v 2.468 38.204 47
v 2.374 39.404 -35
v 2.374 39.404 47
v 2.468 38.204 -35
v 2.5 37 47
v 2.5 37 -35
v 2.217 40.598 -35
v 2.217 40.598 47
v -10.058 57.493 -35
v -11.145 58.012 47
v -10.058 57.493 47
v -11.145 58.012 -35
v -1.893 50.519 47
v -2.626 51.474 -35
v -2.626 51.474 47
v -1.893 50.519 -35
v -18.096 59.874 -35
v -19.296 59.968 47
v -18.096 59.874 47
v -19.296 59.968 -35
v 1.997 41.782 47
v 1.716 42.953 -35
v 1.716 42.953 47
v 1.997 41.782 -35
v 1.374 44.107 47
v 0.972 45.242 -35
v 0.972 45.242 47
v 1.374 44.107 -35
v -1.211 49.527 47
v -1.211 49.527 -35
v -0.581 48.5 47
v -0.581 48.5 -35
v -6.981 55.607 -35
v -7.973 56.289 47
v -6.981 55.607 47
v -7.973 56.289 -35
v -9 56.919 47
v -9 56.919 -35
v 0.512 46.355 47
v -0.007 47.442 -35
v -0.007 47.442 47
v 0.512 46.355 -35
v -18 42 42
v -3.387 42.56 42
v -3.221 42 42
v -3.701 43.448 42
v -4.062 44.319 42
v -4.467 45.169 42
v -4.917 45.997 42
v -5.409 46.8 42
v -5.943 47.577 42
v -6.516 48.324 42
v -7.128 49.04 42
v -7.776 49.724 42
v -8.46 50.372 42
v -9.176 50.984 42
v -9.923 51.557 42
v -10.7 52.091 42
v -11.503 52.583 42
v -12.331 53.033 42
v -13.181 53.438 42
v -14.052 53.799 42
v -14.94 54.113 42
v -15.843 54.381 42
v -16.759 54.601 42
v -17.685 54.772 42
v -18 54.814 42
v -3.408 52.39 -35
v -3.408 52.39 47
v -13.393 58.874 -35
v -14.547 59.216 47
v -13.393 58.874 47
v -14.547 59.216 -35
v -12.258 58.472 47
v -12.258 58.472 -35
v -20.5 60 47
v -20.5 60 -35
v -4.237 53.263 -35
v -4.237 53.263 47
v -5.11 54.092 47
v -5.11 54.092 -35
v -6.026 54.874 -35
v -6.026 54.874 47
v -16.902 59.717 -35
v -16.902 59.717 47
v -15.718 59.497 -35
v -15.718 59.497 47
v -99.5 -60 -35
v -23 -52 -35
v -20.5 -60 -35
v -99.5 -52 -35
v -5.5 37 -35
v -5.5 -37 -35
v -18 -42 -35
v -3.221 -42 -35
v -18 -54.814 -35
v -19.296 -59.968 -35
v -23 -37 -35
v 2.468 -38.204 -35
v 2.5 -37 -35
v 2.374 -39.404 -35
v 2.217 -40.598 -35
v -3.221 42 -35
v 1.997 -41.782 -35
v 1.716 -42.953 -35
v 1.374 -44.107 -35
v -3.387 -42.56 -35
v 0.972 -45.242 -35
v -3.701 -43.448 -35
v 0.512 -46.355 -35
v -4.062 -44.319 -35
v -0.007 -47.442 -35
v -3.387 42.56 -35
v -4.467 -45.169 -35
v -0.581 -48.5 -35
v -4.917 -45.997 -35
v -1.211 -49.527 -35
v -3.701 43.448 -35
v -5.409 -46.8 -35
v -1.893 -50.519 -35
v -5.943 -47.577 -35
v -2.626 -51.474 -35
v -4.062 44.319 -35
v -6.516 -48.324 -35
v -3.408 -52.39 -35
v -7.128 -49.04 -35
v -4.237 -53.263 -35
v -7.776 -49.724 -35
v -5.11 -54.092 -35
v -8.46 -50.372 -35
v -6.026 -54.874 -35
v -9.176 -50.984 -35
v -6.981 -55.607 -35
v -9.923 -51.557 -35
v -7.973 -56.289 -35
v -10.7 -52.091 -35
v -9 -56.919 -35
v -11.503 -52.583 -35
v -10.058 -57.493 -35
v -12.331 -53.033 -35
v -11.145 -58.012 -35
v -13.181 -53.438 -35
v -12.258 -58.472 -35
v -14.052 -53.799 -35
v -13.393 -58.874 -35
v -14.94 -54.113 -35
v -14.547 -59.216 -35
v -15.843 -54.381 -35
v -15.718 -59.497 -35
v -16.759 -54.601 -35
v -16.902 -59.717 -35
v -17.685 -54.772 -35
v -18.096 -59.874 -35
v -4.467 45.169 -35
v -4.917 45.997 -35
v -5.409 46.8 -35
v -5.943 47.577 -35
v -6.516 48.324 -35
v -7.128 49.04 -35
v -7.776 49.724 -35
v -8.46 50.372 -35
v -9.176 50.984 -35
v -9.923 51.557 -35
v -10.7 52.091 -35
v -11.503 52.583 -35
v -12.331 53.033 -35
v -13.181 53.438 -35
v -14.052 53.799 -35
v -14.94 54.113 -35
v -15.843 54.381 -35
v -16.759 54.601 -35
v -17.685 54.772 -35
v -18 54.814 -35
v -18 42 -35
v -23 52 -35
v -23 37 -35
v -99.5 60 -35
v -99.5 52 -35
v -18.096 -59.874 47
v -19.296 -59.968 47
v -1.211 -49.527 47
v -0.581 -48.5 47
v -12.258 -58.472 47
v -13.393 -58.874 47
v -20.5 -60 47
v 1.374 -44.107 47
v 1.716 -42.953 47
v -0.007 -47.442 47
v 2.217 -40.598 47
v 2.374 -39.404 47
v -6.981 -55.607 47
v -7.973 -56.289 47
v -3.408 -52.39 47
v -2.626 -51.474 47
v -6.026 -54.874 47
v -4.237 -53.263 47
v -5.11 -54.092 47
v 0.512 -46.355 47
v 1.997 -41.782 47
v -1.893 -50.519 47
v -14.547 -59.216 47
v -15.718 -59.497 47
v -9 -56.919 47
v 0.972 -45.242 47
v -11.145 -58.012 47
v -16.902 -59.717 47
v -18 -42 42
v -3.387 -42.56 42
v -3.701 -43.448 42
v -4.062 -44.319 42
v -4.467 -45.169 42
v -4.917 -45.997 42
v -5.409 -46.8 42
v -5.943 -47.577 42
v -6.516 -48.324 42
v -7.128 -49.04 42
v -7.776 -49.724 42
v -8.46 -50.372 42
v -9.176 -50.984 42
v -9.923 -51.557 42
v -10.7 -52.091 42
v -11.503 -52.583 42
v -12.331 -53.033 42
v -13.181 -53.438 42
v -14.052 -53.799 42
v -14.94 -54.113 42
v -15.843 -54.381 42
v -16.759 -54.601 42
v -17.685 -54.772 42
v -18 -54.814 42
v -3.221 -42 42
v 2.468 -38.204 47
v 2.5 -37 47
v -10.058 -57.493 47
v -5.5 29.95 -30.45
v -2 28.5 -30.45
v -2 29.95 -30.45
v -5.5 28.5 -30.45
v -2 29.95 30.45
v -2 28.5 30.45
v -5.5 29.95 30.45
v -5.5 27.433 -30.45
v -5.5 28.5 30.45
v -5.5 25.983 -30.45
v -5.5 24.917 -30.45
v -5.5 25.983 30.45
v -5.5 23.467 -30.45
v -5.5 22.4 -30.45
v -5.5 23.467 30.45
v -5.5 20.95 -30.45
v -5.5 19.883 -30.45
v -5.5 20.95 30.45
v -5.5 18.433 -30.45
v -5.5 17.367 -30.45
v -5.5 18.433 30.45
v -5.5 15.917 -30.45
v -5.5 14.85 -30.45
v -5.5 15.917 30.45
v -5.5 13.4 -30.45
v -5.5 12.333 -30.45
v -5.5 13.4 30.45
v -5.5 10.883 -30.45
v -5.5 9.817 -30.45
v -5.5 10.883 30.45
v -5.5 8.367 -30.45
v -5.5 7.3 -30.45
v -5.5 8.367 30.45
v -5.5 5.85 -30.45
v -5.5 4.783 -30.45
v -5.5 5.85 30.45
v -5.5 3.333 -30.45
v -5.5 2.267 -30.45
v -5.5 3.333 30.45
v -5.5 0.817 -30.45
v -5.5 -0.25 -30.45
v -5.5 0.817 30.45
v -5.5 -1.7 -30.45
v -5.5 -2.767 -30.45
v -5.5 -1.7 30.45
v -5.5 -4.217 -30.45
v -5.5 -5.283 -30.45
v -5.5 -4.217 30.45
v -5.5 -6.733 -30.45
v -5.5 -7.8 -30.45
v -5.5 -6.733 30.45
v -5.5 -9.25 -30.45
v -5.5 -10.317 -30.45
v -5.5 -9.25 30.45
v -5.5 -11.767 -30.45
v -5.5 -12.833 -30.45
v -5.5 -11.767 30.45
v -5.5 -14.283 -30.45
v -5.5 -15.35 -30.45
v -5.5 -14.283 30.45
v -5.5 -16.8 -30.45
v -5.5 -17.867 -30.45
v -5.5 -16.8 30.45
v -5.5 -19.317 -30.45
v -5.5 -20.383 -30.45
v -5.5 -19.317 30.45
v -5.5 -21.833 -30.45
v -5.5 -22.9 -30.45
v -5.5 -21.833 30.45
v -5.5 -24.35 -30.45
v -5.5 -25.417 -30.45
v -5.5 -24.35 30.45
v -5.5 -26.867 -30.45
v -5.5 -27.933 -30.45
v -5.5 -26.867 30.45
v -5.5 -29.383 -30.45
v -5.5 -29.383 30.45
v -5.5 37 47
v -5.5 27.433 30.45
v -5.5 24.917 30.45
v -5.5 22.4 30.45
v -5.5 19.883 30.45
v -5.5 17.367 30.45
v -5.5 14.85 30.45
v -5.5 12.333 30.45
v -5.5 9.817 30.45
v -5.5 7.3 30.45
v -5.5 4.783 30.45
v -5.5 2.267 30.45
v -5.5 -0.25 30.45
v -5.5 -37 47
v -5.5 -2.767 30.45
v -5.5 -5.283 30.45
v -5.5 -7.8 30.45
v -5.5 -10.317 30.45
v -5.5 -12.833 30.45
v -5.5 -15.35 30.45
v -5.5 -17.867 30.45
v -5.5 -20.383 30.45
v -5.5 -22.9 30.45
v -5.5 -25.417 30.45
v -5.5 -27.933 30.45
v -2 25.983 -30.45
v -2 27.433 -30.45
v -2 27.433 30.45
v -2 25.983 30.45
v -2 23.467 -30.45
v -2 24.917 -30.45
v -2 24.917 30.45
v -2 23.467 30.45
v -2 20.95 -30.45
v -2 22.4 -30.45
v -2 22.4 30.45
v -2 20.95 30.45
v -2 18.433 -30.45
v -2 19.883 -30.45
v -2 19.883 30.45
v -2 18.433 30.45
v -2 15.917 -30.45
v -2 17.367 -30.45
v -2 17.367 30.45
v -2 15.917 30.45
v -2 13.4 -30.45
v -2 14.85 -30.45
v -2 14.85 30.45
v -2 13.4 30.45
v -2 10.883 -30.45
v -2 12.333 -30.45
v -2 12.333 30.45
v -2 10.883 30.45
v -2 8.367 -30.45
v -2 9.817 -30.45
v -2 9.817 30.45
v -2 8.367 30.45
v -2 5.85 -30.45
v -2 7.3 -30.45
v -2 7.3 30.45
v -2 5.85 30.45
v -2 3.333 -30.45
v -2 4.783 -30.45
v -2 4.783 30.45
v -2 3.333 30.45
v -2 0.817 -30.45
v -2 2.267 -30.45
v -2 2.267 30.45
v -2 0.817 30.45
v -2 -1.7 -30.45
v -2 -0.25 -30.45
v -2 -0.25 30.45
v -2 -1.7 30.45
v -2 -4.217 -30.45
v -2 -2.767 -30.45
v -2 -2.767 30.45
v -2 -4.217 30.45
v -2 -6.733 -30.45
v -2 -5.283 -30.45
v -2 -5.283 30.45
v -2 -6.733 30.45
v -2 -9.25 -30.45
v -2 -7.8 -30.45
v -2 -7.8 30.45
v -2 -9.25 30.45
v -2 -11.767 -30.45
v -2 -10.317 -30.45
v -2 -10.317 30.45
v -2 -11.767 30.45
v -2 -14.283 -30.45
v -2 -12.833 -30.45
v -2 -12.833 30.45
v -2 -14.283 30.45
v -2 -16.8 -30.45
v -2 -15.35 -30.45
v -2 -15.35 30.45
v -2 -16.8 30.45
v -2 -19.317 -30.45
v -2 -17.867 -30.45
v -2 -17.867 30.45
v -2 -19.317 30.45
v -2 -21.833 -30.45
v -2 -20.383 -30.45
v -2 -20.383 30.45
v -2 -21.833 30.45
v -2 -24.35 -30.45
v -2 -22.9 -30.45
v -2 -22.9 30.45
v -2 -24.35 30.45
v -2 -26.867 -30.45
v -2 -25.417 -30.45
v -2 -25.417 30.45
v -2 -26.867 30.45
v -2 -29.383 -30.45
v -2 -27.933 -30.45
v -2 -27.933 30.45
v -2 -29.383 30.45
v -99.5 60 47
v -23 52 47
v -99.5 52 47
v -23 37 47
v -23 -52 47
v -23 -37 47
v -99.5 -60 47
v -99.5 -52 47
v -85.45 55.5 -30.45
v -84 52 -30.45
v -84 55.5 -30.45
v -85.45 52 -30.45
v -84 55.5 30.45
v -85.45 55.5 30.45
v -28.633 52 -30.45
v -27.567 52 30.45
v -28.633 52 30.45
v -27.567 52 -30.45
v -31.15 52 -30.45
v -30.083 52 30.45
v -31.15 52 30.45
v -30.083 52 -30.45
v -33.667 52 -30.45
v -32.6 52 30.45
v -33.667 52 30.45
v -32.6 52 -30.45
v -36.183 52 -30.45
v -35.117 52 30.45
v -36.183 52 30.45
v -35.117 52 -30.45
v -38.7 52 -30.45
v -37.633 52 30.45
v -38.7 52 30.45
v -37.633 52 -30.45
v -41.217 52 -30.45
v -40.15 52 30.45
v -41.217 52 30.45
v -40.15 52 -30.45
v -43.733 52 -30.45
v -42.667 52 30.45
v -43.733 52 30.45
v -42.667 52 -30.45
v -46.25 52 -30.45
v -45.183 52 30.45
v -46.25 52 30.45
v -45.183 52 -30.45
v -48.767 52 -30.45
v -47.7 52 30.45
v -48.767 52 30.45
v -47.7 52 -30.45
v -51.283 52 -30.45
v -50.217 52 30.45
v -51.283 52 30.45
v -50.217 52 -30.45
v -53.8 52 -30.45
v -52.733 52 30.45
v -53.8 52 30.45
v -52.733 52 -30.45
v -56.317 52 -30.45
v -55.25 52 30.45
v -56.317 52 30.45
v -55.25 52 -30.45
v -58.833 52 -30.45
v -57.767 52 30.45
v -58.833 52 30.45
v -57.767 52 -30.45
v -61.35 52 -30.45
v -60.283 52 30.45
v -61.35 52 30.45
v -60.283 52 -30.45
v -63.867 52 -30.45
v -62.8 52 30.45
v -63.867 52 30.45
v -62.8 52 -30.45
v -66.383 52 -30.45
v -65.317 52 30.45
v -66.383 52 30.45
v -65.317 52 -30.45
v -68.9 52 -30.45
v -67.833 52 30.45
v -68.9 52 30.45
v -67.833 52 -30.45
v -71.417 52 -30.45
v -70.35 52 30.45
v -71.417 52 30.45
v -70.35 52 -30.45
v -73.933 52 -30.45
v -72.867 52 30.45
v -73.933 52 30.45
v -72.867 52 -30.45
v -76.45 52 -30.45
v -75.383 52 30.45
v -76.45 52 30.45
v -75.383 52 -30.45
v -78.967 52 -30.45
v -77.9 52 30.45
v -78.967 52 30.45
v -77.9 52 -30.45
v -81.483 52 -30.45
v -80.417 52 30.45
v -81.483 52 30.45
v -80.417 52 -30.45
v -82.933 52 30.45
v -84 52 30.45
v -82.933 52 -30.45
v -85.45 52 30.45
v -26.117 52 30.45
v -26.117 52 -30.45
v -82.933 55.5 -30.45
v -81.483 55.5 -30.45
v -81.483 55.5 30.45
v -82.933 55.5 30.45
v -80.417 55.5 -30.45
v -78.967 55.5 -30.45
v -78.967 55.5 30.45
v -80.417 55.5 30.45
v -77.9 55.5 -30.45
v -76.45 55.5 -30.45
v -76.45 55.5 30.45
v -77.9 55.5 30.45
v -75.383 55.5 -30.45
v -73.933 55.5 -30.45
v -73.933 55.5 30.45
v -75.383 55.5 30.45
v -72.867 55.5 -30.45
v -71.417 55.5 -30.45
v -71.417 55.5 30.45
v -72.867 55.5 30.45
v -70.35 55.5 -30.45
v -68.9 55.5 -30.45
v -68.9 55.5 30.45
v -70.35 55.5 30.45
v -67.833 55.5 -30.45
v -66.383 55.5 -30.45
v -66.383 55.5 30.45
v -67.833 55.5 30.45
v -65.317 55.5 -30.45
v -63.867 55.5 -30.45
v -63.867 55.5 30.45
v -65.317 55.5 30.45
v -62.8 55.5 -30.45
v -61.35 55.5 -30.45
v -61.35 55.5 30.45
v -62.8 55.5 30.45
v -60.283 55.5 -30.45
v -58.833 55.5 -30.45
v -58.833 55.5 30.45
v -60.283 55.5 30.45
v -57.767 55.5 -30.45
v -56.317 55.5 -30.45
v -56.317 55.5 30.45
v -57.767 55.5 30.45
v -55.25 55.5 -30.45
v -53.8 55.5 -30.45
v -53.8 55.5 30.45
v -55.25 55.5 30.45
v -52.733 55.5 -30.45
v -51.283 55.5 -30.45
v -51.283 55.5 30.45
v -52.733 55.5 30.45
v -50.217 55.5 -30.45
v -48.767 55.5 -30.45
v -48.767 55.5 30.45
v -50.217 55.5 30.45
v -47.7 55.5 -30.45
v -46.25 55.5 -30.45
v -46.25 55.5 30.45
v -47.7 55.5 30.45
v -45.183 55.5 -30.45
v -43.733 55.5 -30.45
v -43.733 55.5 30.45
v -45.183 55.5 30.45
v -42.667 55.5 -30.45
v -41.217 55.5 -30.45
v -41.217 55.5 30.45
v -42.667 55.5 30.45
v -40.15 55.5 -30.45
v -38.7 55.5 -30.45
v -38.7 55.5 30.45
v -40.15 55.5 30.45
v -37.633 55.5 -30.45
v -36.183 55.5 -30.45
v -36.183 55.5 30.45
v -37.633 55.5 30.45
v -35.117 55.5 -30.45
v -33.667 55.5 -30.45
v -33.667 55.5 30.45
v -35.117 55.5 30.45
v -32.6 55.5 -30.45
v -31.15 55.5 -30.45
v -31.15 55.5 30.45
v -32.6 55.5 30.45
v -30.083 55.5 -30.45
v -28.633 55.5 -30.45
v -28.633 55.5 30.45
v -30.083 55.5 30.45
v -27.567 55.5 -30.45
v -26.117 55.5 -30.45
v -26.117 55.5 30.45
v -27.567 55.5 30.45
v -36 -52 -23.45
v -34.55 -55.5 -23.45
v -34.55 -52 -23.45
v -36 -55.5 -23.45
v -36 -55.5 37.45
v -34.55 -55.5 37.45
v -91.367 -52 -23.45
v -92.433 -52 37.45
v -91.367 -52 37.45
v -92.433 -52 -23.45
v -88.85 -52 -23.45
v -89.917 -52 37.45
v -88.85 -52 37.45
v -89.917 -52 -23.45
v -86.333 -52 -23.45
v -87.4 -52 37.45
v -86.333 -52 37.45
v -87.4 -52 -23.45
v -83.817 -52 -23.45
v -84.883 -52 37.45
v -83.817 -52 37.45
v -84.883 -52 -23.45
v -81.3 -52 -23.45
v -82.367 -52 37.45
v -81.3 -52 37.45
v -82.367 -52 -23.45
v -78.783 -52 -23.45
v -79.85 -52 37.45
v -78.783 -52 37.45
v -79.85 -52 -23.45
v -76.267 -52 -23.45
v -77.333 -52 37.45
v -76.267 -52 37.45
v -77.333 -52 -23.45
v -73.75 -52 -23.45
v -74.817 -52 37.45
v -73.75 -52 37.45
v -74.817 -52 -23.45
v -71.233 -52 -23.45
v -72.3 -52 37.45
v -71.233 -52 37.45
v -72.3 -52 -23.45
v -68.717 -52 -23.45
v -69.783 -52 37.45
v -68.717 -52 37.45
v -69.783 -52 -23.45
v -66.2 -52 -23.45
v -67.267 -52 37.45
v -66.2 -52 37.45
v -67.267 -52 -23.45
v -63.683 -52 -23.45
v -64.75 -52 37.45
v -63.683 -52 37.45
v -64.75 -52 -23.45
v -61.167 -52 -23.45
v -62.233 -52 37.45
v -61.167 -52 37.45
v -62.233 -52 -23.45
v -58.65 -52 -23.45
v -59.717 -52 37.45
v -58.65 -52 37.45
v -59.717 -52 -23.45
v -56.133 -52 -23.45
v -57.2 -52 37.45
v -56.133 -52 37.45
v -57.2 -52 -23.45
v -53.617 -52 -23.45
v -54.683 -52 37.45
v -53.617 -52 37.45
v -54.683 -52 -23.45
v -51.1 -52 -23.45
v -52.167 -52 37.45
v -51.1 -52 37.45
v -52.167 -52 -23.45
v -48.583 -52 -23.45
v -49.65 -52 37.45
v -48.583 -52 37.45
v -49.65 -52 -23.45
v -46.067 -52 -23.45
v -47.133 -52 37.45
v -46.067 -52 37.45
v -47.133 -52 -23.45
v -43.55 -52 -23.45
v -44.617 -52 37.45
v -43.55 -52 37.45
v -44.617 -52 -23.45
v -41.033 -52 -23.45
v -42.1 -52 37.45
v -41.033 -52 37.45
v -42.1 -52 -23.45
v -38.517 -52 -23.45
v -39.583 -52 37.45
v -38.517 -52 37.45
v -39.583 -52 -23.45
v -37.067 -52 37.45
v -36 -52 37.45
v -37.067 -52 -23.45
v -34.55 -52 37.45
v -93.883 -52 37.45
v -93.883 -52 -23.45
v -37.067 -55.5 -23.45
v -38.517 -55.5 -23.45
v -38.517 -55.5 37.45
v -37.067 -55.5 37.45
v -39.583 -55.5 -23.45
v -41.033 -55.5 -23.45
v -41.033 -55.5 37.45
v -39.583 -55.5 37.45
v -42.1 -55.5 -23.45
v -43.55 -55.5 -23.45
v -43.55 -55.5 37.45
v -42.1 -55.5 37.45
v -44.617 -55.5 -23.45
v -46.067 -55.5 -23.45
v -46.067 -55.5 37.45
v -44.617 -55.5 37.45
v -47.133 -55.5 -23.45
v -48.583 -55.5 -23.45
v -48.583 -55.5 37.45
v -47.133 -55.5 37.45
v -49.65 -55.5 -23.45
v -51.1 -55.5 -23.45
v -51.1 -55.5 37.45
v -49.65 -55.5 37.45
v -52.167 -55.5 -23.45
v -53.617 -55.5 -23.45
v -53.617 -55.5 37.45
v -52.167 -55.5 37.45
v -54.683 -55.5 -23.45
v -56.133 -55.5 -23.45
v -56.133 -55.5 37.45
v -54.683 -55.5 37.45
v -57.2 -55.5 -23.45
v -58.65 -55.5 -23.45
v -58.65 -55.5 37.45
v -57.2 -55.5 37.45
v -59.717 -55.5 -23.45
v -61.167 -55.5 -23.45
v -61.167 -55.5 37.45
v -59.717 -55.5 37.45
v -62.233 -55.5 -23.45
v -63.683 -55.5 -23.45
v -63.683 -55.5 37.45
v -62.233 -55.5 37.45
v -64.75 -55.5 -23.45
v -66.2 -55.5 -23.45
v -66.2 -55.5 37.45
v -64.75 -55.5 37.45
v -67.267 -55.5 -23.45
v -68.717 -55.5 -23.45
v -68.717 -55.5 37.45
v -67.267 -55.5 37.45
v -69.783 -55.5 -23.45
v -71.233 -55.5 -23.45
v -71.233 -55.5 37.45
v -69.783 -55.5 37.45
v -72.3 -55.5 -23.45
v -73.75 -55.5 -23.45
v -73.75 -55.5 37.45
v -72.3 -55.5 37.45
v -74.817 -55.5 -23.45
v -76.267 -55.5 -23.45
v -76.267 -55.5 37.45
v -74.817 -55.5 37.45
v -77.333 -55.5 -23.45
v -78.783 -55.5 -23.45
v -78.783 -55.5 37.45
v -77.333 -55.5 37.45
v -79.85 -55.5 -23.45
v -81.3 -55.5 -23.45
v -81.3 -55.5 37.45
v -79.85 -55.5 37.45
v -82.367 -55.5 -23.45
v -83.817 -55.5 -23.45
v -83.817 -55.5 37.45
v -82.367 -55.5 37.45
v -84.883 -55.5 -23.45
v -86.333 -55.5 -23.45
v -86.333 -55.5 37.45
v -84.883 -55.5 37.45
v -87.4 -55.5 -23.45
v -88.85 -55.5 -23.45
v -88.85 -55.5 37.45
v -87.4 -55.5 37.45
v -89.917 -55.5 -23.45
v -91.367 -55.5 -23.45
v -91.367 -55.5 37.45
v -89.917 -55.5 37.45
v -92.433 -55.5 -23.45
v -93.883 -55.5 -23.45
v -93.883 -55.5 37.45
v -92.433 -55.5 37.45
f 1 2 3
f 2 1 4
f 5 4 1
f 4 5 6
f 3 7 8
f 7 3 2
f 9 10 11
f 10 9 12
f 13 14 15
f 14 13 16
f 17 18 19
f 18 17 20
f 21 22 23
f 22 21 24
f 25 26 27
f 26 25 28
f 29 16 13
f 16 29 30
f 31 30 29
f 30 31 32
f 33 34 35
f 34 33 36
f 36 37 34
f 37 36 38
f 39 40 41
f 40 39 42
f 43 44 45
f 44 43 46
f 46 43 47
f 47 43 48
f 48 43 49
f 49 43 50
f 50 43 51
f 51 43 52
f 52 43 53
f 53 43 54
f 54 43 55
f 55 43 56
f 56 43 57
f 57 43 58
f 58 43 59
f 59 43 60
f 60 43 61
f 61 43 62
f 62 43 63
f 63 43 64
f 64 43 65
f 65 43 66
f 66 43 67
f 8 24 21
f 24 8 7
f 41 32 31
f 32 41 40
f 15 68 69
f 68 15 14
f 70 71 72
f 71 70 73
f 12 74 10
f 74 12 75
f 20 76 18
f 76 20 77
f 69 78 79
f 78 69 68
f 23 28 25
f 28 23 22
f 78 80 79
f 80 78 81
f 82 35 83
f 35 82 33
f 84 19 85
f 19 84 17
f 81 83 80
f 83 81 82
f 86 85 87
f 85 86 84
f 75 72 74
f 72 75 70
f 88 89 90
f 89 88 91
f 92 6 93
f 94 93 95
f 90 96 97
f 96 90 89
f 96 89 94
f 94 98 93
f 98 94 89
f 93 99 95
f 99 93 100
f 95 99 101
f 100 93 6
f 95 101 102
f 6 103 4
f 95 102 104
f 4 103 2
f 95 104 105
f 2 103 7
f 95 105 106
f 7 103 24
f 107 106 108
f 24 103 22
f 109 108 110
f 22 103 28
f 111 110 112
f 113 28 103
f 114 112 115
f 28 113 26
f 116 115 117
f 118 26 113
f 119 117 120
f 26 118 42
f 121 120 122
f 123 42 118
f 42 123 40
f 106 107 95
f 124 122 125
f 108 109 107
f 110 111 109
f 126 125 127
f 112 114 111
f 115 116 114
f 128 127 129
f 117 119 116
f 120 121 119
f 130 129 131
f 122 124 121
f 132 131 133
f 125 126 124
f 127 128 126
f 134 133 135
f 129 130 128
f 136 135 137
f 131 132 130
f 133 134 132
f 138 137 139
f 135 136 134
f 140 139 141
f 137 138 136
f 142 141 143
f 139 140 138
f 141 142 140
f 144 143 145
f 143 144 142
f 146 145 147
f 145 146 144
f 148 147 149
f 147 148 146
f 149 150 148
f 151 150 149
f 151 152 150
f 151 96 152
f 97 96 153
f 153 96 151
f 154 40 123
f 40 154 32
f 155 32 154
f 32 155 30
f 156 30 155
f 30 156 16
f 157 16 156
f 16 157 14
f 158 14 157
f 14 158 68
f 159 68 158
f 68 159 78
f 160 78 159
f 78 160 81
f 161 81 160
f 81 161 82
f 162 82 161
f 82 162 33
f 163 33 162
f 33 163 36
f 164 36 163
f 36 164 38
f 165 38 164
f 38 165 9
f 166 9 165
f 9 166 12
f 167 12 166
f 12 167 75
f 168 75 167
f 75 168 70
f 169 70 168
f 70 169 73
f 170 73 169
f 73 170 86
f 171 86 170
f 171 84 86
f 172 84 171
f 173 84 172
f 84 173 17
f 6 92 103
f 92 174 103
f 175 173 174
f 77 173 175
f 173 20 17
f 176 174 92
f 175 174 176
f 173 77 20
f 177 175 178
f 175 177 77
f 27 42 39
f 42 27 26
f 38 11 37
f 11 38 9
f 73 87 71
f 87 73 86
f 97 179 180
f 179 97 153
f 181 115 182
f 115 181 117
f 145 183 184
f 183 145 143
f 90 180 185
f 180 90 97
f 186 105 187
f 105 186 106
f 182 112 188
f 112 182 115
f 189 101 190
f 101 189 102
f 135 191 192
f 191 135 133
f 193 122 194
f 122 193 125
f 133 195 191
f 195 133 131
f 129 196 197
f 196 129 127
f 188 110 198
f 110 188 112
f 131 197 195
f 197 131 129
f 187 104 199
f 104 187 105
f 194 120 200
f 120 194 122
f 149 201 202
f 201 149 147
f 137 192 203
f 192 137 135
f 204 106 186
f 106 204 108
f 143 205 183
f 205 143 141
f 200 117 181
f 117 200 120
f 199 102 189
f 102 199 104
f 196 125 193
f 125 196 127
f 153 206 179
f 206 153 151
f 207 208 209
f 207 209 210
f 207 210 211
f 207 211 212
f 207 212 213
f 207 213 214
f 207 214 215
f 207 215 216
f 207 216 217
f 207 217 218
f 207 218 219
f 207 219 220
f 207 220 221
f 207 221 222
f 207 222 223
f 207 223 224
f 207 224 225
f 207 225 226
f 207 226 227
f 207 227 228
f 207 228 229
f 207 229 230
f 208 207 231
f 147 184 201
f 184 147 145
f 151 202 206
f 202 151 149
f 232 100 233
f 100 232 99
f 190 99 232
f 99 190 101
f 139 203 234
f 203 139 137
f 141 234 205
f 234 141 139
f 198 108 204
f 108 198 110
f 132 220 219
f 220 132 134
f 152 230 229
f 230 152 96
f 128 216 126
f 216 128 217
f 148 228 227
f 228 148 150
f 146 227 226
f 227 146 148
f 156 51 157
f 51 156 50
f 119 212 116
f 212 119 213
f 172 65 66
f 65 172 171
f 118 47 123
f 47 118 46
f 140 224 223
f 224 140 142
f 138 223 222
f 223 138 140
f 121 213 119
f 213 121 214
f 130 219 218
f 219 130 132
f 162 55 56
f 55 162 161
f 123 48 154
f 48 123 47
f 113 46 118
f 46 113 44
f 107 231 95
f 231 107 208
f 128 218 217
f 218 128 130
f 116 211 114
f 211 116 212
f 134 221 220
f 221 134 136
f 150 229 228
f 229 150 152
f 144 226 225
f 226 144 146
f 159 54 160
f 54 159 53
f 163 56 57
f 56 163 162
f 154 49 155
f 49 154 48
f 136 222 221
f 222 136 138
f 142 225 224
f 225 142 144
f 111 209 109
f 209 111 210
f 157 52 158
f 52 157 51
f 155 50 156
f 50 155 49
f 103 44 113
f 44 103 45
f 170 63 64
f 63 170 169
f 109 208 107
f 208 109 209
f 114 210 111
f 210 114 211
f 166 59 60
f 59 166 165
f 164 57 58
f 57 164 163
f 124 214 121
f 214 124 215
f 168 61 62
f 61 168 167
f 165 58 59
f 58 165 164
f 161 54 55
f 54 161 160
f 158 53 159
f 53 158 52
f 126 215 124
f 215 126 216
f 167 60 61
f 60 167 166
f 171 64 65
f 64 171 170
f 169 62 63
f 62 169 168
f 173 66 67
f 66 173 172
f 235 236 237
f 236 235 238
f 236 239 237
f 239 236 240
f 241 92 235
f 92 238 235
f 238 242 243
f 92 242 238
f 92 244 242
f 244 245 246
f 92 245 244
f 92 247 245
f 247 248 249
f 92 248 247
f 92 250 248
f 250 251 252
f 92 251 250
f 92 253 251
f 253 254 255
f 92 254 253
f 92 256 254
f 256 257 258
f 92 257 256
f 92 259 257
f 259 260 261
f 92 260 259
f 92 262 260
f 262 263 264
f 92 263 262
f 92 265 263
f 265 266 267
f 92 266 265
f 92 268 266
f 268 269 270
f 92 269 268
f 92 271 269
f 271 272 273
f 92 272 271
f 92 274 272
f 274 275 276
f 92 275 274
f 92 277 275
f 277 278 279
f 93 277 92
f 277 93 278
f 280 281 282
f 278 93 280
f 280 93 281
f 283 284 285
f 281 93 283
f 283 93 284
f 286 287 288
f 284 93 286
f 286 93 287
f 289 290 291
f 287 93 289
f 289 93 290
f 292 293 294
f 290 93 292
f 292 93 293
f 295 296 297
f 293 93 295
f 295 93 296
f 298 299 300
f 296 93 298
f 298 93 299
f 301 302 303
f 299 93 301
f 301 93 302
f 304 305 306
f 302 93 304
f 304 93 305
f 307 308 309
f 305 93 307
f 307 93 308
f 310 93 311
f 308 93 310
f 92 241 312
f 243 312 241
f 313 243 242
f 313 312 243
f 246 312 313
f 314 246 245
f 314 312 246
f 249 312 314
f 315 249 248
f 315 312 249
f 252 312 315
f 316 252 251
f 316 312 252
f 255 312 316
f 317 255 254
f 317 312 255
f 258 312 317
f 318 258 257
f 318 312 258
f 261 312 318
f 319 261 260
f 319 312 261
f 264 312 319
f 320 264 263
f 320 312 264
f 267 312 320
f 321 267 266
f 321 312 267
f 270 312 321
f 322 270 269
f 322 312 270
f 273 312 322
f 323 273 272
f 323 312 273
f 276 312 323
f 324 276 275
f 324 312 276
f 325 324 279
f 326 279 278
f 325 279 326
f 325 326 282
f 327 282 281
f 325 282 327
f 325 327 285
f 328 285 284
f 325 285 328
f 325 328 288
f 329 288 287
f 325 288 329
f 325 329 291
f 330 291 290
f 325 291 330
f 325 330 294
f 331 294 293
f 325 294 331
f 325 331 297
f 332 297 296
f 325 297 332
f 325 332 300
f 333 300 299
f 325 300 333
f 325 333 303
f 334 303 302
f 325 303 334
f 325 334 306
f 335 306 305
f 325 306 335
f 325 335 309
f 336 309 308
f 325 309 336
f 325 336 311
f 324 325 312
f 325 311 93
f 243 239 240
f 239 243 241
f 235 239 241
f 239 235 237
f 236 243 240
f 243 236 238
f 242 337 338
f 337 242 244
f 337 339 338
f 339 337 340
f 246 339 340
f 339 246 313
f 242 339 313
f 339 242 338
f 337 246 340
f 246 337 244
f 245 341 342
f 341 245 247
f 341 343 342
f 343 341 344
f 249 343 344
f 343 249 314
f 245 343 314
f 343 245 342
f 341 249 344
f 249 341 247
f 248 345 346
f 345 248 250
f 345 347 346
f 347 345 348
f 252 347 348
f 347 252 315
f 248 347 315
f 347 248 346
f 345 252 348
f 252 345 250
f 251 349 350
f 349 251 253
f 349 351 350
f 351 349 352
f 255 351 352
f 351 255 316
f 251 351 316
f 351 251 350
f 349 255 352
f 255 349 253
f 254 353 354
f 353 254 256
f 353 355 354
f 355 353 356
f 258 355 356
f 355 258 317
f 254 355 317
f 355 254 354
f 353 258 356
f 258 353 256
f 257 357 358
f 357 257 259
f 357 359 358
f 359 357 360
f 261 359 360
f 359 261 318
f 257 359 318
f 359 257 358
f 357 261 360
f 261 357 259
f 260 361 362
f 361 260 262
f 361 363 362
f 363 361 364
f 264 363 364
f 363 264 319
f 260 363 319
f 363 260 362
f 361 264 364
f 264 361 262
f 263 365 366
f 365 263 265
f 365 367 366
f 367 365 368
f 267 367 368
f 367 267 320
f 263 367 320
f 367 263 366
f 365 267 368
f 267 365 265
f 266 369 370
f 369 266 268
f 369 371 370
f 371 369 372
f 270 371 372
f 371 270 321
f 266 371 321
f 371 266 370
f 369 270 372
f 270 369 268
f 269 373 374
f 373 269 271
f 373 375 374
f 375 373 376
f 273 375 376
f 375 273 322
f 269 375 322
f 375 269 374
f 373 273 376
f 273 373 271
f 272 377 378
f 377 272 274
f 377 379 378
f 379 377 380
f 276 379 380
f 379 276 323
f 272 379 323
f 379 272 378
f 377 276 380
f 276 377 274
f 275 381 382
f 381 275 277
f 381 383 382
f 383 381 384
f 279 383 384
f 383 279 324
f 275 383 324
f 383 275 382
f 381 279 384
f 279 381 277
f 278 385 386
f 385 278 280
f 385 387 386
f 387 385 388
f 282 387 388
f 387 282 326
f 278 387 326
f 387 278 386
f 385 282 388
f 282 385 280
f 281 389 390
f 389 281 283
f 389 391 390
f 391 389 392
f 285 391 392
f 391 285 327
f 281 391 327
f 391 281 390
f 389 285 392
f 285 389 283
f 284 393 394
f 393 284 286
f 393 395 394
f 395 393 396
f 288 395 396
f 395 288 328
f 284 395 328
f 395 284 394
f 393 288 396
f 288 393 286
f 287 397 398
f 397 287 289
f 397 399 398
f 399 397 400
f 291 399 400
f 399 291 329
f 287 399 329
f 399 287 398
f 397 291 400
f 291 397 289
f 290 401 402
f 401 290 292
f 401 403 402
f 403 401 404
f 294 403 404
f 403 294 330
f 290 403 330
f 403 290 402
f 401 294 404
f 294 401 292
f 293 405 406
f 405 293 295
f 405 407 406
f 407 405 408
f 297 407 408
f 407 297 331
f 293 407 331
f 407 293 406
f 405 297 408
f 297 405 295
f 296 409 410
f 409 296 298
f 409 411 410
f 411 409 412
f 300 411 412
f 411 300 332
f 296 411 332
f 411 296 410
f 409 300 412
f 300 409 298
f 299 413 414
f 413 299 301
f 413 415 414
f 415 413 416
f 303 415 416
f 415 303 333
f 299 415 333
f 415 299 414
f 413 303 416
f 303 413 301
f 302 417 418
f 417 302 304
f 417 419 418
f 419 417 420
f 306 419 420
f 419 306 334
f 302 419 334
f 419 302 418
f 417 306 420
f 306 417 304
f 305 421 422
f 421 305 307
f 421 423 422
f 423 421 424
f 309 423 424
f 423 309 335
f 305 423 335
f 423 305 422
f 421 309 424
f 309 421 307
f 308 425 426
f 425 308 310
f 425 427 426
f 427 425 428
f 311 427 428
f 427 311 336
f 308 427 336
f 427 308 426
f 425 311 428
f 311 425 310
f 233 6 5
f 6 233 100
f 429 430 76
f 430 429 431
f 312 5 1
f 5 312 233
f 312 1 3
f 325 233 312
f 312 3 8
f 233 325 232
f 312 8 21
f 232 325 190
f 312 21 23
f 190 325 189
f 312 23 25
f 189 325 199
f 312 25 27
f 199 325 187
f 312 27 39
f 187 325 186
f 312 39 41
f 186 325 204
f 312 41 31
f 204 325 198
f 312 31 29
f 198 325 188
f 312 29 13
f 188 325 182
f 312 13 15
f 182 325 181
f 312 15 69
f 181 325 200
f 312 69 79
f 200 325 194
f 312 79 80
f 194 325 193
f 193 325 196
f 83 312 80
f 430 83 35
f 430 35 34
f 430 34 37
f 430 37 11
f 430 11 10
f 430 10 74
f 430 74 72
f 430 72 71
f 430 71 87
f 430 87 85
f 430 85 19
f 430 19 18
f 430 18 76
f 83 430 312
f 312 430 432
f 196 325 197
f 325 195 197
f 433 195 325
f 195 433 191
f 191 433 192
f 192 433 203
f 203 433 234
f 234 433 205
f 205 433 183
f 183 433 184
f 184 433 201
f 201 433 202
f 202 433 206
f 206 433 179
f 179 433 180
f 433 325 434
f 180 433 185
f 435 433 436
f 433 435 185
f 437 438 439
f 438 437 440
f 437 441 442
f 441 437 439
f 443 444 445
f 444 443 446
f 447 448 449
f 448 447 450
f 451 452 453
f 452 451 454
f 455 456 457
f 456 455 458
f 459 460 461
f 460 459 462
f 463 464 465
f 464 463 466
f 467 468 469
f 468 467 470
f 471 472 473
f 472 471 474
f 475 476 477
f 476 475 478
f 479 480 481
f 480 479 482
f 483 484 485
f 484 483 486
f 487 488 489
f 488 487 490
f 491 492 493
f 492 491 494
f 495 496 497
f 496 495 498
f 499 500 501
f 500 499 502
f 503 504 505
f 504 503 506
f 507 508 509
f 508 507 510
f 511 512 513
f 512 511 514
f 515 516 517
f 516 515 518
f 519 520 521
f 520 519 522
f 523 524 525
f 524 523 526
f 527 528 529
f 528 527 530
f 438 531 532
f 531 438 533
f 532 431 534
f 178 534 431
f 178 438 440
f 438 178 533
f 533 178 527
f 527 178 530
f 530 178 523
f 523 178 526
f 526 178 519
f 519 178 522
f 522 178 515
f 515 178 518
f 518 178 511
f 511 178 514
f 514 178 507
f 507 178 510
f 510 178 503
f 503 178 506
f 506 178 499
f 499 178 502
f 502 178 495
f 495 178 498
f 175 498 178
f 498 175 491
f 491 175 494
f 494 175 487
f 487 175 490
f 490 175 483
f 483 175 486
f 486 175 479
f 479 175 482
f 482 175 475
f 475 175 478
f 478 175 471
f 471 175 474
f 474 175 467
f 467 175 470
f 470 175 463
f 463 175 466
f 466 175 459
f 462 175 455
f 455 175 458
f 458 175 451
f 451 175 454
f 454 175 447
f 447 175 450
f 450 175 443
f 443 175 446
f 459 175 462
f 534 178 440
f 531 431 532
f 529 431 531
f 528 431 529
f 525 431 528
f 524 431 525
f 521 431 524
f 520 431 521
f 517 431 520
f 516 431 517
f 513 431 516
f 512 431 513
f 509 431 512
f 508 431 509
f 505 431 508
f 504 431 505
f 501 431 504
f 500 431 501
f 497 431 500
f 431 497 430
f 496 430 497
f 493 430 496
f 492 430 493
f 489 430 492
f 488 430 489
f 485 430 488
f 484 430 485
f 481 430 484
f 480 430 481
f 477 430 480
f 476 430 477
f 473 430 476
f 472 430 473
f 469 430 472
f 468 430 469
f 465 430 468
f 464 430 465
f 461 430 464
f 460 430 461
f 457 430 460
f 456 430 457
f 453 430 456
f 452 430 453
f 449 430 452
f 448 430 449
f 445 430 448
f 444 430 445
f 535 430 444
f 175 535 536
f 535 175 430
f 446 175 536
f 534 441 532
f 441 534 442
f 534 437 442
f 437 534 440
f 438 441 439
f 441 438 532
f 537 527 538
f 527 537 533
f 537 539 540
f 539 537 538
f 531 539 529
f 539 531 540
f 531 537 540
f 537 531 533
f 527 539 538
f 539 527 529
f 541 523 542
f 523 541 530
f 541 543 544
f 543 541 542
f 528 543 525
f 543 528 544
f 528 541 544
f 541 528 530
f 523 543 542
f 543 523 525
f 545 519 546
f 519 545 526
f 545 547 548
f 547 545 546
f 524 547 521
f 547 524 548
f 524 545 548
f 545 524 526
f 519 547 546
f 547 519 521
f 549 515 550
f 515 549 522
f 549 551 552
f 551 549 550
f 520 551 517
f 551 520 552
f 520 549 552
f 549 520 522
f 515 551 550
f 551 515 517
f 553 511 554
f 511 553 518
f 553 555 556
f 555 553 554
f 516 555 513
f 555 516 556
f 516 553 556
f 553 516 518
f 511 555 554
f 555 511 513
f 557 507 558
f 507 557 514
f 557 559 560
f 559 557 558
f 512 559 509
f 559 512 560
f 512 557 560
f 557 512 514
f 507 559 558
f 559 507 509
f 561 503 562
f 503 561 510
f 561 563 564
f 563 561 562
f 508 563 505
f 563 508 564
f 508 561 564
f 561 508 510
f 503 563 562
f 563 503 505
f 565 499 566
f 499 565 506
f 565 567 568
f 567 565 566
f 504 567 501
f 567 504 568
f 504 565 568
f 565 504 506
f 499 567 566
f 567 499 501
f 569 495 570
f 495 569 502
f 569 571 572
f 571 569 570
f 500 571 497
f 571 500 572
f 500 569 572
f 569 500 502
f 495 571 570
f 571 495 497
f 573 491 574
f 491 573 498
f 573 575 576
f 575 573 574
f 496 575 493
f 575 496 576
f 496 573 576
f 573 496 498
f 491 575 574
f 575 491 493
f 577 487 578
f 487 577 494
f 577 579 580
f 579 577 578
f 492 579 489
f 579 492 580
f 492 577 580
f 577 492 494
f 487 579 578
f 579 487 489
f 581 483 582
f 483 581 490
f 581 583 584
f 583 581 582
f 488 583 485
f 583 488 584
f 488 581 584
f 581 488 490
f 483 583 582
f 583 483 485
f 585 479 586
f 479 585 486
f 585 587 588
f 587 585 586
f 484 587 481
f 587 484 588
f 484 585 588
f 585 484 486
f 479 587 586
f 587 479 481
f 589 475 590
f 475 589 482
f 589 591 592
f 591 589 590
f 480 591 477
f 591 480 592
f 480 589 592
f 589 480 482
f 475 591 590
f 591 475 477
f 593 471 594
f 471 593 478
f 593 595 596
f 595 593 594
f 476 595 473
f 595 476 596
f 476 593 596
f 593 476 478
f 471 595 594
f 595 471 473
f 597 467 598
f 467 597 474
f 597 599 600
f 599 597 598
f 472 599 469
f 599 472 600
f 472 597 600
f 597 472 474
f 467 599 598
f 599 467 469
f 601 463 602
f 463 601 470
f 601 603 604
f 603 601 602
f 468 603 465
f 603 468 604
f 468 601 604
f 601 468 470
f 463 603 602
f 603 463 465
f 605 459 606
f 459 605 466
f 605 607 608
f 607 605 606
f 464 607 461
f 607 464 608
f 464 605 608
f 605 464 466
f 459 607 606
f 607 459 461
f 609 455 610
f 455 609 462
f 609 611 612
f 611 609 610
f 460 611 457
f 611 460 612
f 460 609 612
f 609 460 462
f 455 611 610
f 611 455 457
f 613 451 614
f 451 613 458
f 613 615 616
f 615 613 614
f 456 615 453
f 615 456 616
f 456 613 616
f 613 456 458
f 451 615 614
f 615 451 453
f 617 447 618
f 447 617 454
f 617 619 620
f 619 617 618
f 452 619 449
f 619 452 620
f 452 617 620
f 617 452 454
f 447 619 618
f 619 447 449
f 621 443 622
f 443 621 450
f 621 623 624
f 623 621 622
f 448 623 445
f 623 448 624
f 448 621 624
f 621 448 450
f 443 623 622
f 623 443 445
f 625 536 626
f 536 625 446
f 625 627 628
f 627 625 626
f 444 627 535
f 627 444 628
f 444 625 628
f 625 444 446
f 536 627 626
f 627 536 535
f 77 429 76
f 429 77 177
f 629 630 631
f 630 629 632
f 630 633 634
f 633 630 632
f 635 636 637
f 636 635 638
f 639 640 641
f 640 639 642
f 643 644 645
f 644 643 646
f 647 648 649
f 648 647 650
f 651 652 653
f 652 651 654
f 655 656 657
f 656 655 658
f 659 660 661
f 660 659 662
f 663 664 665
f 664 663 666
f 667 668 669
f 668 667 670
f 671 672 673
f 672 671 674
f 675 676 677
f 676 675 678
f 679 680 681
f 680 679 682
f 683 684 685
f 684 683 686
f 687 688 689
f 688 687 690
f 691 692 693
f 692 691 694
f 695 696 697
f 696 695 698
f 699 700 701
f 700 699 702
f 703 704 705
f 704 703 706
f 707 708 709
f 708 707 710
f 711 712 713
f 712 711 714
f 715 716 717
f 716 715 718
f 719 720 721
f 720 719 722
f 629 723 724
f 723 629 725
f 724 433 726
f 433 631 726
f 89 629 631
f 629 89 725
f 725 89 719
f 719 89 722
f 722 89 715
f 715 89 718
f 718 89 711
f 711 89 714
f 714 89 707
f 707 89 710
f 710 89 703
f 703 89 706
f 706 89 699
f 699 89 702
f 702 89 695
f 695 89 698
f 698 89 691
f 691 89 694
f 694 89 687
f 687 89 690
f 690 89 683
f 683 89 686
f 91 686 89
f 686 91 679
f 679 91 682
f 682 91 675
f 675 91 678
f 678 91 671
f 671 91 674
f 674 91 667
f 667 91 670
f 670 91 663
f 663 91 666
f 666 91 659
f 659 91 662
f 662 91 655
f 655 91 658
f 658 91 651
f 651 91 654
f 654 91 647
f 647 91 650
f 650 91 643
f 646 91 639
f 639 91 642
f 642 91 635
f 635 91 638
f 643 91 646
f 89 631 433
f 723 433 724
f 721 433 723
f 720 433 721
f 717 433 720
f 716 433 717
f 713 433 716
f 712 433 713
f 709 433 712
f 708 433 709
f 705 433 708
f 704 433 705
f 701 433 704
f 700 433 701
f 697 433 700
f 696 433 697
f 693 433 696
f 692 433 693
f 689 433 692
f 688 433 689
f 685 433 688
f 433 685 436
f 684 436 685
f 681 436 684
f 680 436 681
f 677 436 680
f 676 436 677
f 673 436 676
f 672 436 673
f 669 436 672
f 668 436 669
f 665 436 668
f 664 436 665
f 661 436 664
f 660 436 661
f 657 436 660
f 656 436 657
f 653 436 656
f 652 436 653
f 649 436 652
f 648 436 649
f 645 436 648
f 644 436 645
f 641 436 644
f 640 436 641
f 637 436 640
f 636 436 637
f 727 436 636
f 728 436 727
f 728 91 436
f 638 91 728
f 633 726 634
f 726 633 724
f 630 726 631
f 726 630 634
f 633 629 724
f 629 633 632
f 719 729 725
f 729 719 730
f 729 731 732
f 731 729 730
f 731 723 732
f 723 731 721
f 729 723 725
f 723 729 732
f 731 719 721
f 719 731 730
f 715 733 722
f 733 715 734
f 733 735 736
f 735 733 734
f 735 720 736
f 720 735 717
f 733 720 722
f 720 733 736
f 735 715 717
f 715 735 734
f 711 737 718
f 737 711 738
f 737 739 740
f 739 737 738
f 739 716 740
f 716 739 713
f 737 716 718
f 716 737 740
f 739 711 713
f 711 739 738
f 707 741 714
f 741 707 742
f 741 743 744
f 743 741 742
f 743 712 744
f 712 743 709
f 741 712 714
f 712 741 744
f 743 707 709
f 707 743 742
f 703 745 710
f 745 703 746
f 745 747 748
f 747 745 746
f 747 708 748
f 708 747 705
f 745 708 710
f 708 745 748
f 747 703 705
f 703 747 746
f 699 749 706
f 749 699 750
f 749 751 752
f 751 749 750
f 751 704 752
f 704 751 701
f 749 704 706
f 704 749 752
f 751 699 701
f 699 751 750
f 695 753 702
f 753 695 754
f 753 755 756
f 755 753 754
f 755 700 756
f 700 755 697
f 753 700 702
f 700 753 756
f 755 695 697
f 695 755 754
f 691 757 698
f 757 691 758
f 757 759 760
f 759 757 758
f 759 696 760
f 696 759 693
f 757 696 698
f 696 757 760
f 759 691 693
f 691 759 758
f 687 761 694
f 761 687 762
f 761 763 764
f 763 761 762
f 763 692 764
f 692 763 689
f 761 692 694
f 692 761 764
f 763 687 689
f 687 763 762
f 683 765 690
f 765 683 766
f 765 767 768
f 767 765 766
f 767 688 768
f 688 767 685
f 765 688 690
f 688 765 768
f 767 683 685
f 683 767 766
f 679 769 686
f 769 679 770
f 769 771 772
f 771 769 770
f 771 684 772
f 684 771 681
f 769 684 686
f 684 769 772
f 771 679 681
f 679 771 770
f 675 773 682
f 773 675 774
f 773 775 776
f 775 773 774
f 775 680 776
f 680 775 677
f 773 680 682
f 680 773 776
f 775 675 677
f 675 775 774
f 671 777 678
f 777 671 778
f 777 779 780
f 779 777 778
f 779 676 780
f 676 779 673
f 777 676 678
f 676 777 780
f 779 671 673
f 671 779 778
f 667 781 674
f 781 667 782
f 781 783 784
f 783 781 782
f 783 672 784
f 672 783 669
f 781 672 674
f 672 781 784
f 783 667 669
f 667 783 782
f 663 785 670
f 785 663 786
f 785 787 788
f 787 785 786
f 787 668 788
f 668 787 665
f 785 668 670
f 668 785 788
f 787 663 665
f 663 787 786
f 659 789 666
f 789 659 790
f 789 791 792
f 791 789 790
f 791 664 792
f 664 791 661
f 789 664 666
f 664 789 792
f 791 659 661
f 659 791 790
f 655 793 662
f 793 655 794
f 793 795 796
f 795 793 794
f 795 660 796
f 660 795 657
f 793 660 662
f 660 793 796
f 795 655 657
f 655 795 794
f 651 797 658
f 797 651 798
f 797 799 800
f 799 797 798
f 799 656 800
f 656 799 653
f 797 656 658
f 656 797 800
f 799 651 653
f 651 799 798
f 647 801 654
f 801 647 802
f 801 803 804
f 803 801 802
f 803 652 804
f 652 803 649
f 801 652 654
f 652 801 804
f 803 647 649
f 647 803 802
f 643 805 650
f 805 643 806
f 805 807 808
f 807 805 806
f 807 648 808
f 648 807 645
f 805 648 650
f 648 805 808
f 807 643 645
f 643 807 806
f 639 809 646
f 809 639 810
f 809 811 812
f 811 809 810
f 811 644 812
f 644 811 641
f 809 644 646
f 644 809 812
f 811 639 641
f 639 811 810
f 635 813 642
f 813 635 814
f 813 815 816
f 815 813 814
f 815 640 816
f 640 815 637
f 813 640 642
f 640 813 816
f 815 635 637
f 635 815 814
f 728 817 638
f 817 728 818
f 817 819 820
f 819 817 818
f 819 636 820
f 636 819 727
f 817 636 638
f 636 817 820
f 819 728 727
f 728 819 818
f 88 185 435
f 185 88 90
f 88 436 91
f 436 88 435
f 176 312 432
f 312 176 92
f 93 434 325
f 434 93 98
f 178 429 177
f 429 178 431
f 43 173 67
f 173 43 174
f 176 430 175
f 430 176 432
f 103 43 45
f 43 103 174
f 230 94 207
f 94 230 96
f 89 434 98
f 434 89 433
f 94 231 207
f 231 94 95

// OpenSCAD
//Created by Ryan Branch on 16 October 2017
//Makes use of roundedcube_simple, which was
//written by Daniel Upshaw A.K.A. GrooverNectar.
//More info here: https://danielupshaw.com/openscad-rounded-corners/

//V A R I A B L E S
//All units are millimeters unless otherwise specified

//N O T E S   F O R   O N S H A P E
//When attempting to create this object, it may be useful
//to know the following: (TRUE AS OF 17 OCTOBER 2017 EDIT)
// - fin "space length" = 1.900 mm
//       "tile length"  = 2.550 mm
// - row "space length" = 2.260 mm
// -     "tile length"  = 10.460 mm

//HEATSINK PROPERTIES
heatsink_width_parallel = 60.90;
heatsink_width_perpendicular = 60.40;
fin_height = 25.00;
fins_per_row = 24;
num_rows = 6;
//PART PROPERTIES
part_height = 5.0; //A LOT IS BASED ON THIS NUMBER. (PART_HEIGHT)
heatsink_in = 3.0; //USE HEATSINK_IN INSTEAD FOR CHANGES
cap_height = 4.5;
part_width_parallel = 70.00;
part_width_perpendicular = 70.00;
finTolerance = 0.80;
rowTolerance = 1.20;

//CURRENT GUESSES
fin_width = 0.65;
row_width = 8.20;

//MOUNT POSITIONING, SET
x_offset_left = -55.5;
y_offset_left = 57.5;
z_offset_left = 0;
x_offset_right = -64.5;
y_offset_right = -57.5;
z_offset_right = 7;
top_thickness = 5;
//MOUNT POSITIONING, CALCULATED

//The rows all line up with the heatsink edge.
//The fins at each end have half a "fin space" at each edge.
//This means that there are effectively (num_rows - 1) row spaces
// and (fins_per_row) fin spaces (with one space being divided in half)
finSpaceWidth = (heatsink_width_perpendicular - (fins_per_row * fin_width)) / fins_per_row;
rowSpaceWidth = (heatsink_width_parallel - (num_rows * row_width)) / (num_rows - 1);



//G L O B A L
$fn = 120;




// M O D U L E S
// M O D U L E S
// M O D U L E S

//groovenectar's roundedcube_simple.scad
module roundedcube_simple(size = [1, 1, 1], center = false, radius = 0.5) {
	// If single value, convert to [x, y, z] vector
	size = (size[0] == undef) ? [size, size, size] : size;

	translate = (center == false) ?
		[radius, radius, radius] :
		[
			radius - (size[0] / 2),
			radius - (size[1] / 2),
			radius - (size[2] / 2)
	];

	translate(v = translate)
	minkowski() {
		cube(size = [
			size[0] - (radius * 2),
			size[1] - (radius * 2),
			size[2] - (radius * 2)
		]);
		sphere(r = radius);
	}
}



// P A R T
// P A R T
// P A R T
union() {

//SECTION 1: Forms the rounded profile which connects each heatsink negative plate
difference() {
    union (){
        //The cylinder path connecting left to middle
        translate([-20.5, 37, z_offset_right/2]) {
            cylinder(part_width_parallel + z_offset_right, 23, 23, true);
        }
        //The cylinder path connecting middle to right
        translate([-20.5, -37, z_offset_right/2]) {
            cylinder(part_width_parallel + z_offset_right, 23, 23, true);
        }
    }
    
    //REMOVING HEATSINK PLATE CUBES SO THEY CAN BE REPLACED LATER
    //TOP
    rotate([0, 90, 0]) {
        cube([part_width_parallel, part_width_perpendicular, part_height * 2], true);
    }
    //LEFT
    translate([x_offset_left, y_offset_left, 0]) {
    rotate([0, 90, 90]) {
        cube([part_width_parallel, part_width_perpendicular, part_height * 2], true);
        }
    }
    //RIGHT
    translate([x_offset_right, y_offset_right, z_offset_right]) {
        rotate([0, 90, -90]) {
            translate([z_offset_right/2, 0, 0]) {
                cube([part_width_parallel + z_offset_right, part_width_perpendicular, part_height * 2], true);
            }
        }
    }
    
    //Central "roundedcube" subtracted to rid the rest of cylinders
    //NOTE: 110 == ((57.5 - (5 / 2)) * 2)
    translate([-57.5, 0, 0]) {
        roundedcube_simple([110, 110, part_width_parallel * 2], true, 18);
    }    
}





//SECTION 2: EXTRA RECTANGLES FOR WHOLENESS
//These are specifically determined based on corner radius sizing and positioning.
//Between LEFT and MIDDLE
translate([(heatsink_in / -2), 36, (z_offset_right + top_thickness)/2]) {
    cube([(part_height + heatsink_in), 2, part_width_parallel + z_offset_right + top_thickness], true);
}
//Between MIDDLE and RIGHT
translate([(heatsink_in / -2), -36, (z_offset_right + top_thickness)/2]) {
    cube([(part_height + heatsink_in), 2, part_width_parallel + z_offset_right + top_thickness], true);
}
//"TOP" (Closer to MIDDLE) end of RIGHT
translate([-25, -57.5 + (heatsink_in / 2), (z_offset_right + top_thickness)/2]) {
    cube([9, (part_height + heatsink_in), part_width_parallel + z_offset_right + top_thickness], true);
}
//At FAR END OF LEFT
translate([-95, 57.5 - (heatsink_in / 2), (z_offset_right + top_thickness)/ 2]) {
    cube([9, (part_height + heatsink_in), part_width_parallel + z_offset_right + top_thickness], true);
}
//RECTANGLE COLUMNS FOR BLOCKING AIRFLOW
//LEFT SIDE
//X axis aligned rectangle column
//46 = 55 - 9
//20.5 = 5 + 18 - 2.5
translate([-20.5, 46, (z_offset_right + top_thickness)/ 2]) {
    cube([5, 18, part_width_parallel + z_offset_right + top_thickness], true);
}
//Y axis aligned (Just ADD 9 to X, SUBTRACT 9 from Y), SWAP X/Y DIMS
//39.5 = (46 - 9) + 2.5
translate([-11.5, 39.5, (z_offset_right + top_thickness)/ 2]) {
    cube([18, 5, part_width_parallel + z_offset_right + top_thickness], true);
}
//RIGHT SIDE
//Just make Y's TRANSLATIONS opposite
//X axis aligned rectangle column
translate([-20.5, -46, (z_offset_right + top_thickness)/ 2]) {
    cube([5, 18, part_width_parallel + z_offset_right + top_thickness], true);
}
//Y axis aligned (Just ADD 9 to X, SUBTRACT 9 from Y), SWAP X/Y DIMS
translate([-11.5, -39.5, (z_offset_right + top_thickness)/ 2]) {
    cube([18, 5, part_width_parallel + z_offset_right + top_thickness], true);
}





//SECTION 3: The HEATSINK MOUNT ASSEMBLIES
//The top "heatsink mount assembly"
rotate([0, 90, 0]) {
        difference() {
        //This first object is the base from which the others are subtracted
        translate([(z_offset_right + top_thickness)/-2, 0, (heatsink_in / -2)]) {
            cube([part_width_parallel + z_offset_right + top_thickness, part_width_perpendicular, part_height + heatsink_in], true);
        }
        
        //This loop describes removal of parallel strips
        for (fin=[0:fins_per_row - 1]) {
            translate([0,
                       (heatsink_width_perpendicular / 2) - (fin_width * 1.5) - (fin * (fin_width + finSpaceWidth)),
                       (cap_height + heatsink_in) / -2]) {
                cube([heatsink_width_parallel,
                      fin_width + finTolerance,
                      part_height - cap_height + heatsink_in], true);
            }
        }
    }
}

//The left "heatsink mount assembly" (viewed from behind)
translate([-55.5, 57.5, 0]) {
    rotate([0, 90, 90]) {
        difference() {
            //This first object is the base from which the others are subtracted
            translate([(z_offset_right + top_thickness)/-2, 0, (heatsink_in / -2)]) {
                cube([part_width_parallel + z_offset_right + top_thickness, part_width_perpendicular, part_height + heatsink_in], true);
            }
            
            //This loop describes removal of parallel strips
            for (fin=[0:fins_per_row - 1]) {
                translate([0,
                           (heatsink_width_perpendicular / 2) - (fin_width * 1.5) - (fin * (fin_width + finSpaceWidth)),
                           (cap_height + heatsink_in) / -2]) {
                    cube([heatsink_width_parallel,
                          fin_width + finTolerance,
                          part_height - cap_height + heatsink_in], true);
                }
            }
        }
    }
}

//The right "heatsink mount assembly" (viewed from behind)
translate([-64.5, -57.5, z_offset_right]) {
    rotate([0, 90, -90]) {
        difference() {
            //This first object is the base from which the others are subtracted
            translate([(z_offset_right - top_thickness)/2, 0, (heatsink_in / -2)]) {
                cube([part_width_parallel + z_offset_right + top_thickness, part_width_perpendicular, part_height + heatsink_in], true);
            }
            
            //This loop describes removal of parallel strips
            for (fin=[0:fins_per_row - 1]) {
                translate([0,
                           (heatsink_width_perpendicular / 2) - (fin_width * 1.5) - (fin * (fin_width + finSpaceWidth)),
                           (cap_height + heatsink_in) / -2]) {
                    cube([heatsink_width_parallel,
                          fin_width + finTolerance,
                          part_height - cap_height + heatsink_in], true);
                }
            }
        }
    }
}

//SECTION 4: Columns for blocking (MOST) air
//This translate places the center line at (top_thickness/2) above the actual part
//This is a direct Z shift from the origin
translate([0, 0, (part_width_parallel + top_thickness) / 2 + z_offset_right]) {
    difference() {
        union (){
            //The cylinder path connecting left to middle
            translate([-20.5, 37, 0]) {
                cylinder(top_thickness, 23, 23, true);
            }
            //The cylinder path connecting middle to right
            translate([-20.5, -37, 0]) {
                cylinder(top_thickness, 23, 23, true);
            }
        }
        //Subtracted to remove cylinder half with X axis split
        //20.5 = 18 + 2.5
        translate([-20.5, 0, 0]) {
            //74 = 110 - 2(18)
            //46 = 2(18) + 2(5)
            cube([46,74,top_thickness], true);
        }
        //Subtracted to remove cylinder half with Y axis split
        //38.5 = 2(18) + 2.5
        translate([-38.5, 0, 0]) {
            //120 = 110 + 2(5)
            //36 = 2(18)
            cube([36,120,top_thickness], true);
        }
    }
}

}//OUTER UNION
